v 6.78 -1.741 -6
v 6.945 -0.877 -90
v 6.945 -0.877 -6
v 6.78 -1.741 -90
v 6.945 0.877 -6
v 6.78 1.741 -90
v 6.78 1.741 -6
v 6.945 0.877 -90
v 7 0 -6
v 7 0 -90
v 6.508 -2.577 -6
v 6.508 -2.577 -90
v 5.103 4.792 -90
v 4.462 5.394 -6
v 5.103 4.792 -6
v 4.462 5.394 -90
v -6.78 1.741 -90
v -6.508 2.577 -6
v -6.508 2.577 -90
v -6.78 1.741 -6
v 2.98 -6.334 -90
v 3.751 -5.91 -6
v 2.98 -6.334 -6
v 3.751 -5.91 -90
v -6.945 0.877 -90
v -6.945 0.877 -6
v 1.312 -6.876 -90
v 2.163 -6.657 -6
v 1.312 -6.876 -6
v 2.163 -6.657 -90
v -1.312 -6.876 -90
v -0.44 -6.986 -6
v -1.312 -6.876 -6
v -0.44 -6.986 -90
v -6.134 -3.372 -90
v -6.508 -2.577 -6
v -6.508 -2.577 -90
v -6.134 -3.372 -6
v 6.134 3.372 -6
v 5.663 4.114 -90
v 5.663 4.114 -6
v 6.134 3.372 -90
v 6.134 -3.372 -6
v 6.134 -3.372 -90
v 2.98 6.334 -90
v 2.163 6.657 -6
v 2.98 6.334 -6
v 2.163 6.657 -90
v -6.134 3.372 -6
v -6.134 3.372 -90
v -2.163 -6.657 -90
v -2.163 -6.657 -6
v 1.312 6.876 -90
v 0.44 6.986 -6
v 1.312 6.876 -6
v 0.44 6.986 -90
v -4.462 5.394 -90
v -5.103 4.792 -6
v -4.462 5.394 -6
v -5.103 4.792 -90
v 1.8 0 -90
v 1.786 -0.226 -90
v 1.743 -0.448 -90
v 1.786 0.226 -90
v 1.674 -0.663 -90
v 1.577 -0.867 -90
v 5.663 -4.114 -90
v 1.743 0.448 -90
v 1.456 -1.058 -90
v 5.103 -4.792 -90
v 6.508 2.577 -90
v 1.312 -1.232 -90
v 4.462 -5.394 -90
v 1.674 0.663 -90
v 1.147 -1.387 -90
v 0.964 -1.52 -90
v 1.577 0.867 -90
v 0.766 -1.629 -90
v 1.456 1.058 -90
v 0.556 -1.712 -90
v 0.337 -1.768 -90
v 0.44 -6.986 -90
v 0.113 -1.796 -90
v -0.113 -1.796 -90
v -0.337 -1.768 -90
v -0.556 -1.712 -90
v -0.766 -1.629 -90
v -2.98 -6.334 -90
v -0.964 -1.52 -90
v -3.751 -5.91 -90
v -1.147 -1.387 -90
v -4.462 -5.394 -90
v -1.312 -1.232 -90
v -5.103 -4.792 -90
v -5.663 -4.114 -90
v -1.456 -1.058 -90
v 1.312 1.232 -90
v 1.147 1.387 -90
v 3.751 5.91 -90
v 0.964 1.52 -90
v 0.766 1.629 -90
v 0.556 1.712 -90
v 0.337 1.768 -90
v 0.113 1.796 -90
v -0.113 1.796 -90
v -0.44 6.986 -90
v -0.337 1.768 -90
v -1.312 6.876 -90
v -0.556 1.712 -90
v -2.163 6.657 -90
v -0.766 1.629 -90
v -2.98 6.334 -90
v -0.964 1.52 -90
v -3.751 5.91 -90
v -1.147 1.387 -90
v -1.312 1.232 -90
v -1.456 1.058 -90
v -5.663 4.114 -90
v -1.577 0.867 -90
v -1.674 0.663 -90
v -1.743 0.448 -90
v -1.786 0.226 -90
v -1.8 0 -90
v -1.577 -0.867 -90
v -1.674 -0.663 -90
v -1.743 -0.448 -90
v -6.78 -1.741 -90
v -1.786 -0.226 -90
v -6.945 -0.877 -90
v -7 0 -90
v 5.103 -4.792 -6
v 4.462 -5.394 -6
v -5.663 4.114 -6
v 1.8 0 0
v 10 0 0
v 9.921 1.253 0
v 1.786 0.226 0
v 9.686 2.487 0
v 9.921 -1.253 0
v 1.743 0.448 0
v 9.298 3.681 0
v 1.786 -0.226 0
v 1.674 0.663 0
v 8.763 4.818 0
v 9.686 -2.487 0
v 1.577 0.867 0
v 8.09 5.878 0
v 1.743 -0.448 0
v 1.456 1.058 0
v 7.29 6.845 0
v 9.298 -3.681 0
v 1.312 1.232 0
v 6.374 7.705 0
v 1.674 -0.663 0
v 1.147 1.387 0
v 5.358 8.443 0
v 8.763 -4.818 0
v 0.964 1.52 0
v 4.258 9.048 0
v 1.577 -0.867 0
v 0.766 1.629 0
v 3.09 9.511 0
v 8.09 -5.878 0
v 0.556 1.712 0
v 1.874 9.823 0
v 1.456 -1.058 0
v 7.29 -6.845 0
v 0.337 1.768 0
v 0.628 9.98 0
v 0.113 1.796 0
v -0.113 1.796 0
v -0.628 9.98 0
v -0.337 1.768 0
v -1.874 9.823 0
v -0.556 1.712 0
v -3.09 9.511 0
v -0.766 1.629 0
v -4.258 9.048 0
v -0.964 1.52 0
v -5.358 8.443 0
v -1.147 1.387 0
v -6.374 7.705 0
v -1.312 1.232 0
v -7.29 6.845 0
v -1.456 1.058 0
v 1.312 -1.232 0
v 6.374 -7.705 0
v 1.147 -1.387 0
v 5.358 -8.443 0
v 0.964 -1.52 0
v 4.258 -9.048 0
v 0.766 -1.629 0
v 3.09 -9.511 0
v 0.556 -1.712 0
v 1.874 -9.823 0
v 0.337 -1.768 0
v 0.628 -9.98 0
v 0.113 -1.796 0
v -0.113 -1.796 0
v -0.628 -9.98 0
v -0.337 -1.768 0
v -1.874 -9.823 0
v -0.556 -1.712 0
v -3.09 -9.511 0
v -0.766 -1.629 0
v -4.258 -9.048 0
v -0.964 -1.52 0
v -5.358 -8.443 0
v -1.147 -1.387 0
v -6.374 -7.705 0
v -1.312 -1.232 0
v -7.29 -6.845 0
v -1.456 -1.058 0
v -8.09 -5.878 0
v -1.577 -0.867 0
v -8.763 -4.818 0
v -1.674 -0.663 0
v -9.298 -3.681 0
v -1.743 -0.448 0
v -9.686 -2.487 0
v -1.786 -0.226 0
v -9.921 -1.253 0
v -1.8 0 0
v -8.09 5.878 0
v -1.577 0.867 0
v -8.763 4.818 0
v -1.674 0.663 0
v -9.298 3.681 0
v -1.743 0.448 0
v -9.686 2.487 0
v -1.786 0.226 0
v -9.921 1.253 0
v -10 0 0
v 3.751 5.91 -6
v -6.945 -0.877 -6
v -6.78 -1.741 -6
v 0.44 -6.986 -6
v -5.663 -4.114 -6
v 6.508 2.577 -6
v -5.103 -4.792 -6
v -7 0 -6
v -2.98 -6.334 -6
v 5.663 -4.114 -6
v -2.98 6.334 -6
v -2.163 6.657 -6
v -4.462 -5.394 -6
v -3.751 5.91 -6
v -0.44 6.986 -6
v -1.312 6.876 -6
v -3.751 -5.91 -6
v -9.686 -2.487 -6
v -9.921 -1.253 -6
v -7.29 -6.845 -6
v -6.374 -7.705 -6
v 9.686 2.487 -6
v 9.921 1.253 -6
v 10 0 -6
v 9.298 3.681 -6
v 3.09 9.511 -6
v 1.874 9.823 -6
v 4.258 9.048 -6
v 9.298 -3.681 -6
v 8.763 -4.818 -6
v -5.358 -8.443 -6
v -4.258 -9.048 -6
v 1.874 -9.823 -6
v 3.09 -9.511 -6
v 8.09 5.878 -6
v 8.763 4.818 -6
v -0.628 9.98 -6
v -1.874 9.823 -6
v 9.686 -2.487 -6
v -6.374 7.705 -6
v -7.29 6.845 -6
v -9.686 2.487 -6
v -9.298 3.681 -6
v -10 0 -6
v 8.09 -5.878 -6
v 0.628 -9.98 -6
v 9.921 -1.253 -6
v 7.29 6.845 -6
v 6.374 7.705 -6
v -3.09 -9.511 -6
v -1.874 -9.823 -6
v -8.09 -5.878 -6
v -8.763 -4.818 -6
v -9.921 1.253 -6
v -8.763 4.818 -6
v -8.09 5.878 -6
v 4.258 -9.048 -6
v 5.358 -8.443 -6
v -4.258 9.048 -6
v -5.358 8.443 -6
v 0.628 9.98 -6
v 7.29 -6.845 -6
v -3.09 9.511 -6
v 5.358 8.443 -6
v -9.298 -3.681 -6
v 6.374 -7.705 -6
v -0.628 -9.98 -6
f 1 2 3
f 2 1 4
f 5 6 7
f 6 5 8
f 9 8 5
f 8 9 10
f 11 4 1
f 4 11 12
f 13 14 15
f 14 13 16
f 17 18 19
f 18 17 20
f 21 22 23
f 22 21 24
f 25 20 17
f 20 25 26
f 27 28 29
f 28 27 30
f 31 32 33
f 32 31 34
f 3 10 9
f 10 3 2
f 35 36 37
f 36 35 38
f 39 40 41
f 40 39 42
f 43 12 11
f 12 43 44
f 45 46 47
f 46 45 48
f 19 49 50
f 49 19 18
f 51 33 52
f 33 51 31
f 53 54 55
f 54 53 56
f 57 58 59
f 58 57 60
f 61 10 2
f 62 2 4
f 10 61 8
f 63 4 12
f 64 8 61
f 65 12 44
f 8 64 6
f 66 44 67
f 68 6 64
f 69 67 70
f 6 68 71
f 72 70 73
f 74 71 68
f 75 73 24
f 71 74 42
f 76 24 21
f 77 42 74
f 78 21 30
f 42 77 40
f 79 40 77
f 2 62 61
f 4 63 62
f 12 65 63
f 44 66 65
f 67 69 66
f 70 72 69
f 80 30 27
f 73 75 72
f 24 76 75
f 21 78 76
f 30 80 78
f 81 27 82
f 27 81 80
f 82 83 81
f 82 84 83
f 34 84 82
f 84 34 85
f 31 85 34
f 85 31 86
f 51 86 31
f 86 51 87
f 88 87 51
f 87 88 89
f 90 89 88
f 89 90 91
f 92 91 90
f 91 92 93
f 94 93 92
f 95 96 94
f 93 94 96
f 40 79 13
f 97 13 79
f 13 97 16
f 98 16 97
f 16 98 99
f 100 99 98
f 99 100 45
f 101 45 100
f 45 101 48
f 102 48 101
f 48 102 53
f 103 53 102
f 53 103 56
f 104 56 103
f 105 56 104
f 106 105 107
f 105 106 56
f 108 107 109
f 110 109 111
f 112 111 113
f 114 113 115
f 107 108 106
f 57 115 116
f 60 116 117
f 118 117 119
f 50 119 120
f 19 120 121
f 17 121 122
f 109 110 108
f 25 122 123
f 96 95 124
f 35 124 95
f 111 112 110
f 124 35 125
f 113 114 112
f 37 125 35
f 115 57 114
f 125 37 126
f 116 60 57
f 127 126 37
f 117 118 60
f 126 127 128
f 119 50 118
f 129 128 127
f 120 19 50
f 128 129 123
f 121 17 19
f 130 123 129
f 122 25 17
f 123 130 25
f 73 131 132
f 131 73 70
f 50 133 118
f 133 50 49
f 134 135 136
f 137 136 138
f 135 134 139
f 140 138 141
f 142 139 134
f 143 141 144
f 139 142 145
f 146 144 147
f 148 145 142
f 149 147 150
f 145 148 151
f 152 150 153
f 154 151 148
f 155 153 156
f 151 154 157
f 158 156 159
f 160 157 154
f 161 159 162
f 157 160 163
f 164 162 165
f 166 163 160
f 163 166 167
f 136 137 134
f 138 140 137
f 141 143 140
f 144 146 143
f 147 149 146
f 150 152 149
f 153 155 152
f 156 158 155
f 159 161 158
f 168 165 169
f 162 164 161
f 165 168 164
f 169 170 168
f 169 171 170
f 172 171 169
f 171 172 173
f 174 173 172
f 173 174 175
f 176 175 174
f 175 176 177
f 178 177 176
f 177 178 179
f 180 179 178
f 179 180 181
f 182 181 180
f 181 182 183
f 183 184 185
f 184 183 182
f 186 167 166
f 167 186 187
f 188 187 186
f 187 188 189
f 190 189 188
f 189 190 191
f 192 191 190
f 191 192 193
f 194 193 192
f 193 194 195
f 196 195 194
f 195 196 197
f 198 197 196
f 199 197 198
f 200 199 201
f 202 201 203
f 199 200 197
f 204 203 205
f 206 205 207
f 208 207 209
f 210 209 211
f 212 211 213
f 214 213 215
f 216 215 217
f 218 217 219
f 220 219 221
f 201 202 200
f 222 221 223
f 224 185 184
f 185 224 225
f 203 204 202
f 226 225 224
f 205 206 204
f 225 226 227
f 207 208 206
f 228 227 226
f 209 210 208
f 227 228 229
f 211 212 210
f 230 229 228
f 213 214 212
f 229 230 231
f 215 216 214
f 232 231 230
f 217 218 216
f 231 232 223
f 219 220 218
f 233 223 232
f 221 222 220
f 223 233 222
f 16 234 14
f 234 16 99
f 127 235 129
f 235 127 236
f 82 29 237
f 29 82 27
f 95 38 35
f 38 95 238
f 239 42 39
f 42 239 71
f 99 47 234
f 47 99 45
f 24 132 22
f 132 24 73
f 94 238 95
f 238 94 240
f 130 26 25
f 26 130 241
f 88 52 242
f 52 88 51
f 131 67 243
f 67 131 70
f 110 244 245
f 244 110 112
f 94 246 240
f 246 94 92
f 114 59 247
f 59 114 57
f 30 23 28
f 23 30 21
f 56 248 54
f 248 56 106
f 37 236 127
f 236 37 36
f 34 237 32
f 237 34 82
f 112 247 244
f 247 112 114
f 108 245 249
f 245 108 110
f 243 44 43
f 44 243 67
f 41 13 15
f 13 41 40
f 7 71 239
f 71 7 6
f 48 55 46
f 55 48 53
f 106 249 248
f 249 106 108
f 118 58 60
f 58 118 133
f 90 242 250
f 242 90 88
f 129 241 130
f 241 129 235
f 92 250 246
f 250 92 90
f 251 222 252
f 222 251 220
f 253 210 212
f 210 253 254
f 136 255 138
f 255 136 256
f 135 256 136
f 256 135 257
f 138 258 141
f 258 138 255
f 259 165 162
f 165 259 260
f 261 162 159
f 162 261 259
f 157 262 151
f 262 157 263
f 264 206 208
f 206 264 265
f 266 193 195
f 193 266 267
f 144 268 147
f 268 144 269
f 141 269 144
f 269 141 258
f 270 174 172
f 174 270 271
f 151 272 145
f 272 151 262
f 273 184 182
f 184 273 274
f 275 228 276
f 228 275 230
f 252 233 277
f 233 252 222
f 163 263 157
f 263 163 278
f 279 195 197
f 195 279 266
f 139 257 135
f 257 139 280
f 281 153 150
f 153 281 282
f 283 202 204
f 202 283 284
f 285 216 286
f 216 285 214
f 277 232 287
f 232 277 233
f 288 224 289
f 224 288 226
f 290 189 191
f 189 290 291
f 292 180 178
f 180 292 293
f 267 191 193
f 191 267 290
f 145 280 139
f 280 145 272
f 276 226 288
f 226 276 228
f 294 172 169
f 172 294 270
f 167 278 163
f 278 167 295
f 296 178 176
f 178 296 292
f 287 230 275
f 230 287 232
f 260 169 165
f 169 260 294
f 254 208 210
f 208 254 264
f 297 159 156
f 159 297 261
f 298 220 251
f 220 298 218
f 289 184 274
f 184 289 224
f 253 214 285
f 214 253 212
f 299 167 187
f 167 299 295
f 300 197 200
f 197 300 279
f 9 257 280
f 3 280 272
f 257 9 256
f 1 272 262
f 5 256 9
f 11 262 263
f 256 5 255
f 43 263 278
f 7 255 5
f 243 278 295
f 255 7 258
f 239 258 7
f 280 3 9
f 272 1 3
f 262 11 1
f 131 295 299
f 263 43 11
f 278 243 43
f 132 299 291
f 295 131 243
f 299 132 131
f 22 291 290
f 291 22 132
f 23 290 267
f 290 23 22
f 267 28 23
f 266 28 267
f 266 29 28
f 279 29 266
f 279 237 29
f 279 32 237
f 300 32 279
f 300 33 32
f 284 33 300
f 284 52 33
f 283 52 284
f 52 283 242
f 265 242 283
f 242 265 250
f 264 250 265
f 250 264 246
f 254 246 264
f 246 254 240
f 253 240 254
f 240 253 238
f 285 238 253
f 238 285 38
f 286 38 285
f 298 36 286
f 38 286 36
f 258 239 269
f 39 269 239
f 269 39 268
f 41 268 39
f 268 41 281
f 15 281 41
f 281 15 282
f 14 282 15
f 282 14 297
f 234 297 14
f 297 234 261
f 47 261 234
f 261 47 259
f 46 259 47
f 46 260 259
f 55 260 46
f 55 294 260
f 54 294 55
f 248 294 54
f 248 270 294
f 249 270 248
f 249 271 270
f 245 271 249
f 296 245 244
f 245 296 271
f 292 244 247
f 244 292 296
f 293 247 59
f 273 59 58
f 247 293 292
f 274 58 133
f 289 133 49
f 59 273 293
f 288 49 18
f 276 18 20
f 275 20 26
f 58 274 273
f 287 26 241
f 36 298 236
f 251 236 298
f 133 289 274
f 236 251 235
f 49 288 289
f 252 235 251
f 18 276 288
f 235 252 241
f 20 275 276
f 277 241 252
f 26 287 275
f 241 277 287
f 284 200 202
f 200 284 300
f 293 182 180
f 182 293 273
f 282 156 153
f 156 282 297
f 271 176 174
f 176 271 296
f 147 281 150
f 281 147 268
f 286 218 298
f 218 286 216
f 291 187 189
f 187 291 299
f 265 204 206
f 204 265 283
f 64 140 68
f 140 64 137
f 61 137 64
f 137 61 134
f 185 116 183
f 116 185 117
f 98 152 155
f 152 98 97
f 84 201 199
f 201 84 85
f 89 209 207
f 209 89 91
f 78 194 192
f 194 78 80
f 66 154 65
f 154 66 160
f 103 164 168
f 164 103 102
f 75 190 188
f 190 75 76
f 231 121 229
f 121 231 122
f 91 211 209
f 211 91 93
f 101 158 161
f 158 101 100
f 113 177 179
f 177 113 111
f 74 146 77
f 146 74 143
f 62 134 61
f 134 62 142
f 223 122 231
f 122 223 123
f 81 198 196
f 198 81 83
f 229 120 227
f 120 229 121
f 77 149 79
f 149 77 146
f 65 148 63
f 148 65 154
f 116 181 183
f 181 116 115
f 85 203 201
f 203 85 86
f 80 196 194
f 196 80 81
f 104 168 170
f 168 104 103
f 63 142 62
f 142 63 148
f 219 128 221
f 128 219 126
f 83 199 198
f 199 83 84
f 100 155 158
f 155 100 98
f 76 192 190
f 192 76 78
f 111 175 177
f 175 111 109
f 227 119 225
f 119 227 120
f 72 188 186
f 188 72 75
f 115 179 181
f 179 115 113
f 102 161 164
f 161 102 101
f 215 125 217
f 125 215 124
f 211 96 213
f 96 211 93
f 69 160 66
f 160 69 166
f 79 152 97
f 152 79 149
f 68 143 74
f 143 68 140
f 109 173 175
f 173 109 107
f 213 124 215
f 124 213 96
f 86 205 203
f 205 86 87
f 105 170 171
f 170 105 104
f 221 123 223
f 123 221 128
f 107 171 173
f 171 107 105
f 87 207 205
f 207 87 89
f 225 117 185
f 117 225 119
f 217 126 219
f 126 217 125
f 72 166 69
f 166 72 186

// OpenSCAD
$fn = 50;


difference() {
	union() {
		translate(v = [0, 0, -90.0000000000]) {
			cylinder(h = 90, r = 7.0000000000);
		}
		translate(v = [0, 0, -6.0000000000]) {
			cylinder(h = 6, r = 10.0000000000);
		}
	}
	union() {
		#translate(v = [0, 0, -90]) {
			cylinder(h = 90, r = 1.8000000000);
		}
	}
}
